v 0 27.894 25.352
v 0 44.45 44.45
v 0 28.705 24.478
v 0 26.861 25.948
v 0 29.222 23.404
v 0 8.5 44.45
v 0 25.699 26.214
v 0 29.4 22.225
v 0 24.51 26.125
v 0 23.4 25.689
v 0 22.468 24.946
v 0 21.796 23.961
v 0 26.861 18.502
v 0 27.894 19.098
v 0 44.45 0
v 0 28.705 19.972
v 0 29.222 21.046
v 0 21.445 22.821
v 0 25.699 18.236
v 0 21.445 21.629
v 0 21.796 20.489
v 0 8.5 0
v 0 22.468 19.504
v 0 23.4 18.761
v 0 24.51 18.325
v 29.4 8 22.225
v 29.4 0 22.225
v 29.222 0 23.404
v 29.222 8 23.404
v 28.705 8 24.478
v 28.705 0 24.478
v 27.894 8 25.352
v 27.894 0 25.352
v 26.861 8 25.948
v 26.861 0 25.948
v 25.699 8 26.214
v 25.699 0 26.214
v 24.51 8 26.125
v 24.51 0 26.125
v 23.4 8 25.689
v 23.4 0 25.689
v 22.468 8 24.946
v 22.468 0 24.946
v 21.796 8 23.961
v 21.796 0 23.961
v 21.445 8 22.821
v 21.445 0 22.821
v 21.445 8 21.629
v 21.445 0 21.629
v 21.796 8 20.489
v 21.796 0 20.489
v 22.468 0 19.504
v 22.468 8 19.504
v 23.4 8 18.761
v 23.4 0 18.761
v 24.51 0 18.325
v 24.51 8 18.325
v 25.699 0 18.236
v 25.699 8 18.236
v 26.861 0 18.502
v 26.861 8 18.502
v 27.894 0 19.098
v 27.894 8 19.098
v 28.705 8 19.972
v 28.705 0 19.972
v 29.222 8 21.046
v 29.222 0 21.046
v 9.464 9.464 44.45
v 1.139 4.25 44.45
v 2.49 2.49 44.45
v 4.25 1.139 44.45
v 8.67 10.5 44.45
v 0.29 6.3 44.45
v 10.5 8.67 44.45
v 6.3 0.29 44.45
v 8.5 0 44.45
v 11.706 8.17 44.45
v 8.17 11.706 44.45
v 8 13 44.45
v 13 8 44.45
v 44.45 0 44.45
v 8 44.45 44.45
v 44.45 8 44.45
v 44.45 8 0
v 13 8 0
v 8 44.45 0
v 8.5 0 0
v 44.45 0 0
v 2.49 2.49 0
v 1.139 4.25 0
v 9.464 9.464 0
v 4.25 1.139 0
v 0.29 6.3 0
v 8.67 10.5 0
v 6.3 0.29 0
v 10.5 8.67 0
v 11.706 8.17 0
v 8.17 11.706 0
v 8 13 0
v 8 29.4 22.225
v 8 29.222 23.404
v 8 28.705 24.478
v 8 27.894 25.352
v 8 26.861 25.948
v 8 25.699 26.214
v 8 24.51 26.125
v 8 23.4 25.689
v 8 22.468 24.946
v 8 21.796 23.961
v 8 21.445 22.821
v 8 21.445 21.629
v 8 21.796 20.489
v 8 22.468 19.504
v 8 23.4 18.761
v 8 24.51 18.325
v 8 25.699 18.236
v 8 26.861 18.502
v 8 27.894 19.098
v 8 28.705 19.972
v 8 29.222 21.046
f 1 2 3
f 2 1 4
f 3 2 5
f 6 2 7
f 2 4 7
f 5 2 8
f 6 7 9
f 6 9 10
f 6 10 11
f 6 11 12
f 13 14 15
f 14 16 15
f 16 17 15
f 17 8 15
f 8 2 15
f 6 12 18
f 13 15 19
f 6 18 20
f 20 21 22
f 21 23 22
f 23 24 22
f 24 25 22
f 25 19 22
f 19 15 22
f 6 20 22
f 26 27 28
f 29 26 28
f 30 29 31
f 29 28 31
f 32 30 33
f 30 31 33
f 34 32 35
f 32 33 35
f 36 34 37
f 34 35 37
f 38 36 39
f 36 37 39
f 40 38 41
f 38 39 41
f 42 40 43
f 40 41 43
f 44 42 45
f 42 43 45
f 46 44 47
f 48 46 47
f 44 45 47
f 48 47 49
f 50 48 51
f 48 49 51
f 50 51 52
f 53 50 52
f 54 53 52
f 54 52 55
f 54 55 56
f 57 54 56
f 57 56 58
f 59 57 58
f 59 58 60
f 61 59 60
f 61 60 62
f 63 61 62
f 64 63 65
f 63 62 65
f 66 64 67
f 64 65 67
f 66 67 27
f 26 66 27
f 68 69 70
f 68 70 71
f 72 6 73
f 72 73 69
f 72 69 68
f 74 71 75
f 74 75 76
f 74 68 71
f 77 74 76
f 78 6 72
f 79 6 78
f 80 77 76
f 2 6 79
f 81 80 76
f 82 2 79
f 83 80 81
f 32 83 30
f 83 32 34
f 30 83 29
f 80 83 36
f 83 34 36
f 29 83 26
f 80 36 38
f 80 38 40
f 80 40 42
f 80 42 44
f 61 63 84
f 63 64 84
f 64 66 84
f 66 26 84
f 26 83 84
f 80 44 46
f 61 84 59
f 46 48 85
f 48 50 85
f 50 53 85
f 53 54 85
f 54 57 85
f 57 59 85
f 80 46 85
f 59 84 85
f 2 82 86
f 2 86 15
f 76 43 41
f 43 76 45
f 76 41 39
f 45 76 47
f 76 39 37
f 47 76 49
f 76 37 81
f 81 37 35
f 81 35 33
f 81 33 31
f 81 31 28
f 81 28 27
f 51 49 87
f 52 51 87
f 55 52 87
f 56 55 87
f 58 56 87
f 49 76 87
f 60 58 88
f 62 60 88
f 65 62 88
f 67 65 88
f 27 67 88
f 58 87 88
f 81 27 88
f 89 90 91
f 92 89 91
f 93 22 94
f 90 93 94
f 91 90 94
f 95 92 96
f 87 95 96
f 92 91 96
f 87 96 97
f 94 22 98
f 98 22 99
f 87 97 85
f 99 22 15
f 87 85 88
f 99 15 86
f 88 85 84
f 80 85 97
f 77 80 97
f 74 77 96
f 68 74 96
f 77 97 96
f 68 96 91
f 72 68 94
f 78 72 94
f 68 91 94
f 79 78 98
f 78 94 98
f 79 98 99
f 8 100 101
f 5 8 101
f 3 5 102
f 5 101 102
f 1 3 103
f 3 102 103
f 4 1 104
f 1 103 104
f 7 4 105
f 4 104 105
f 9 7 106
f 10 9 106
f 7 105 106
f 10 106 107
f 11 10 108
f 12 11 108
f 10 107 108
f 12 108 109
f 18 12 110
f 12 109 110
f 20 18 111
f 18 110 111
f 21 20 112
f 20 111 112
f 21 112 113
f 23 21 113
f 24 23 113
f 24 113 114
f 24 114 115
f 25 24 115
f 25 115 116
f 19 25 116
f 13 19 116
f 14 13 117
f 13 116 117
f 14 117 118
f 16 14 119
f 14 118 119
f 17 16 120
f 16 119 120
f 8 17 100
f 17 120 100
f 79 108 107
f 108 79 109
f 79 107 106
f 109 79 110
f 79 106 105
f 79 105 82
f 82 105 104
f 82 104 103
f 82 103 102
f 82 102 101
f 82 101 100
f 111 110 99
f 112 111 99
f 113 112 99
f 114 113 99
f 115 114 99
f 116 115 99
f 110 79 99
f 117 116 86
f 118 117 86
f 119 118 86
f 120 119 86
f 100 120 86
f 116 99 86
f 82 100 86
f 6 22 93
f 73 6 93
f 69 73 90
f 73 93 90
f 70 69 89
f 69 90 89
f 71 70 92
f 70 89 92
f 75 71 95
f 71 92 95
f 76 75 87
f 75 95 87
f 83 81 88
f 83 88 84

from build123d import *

# Parameters (mm, degrees)
F1_DEPTH = 44.45
F2_R     = 4
F3_DEPTH = 8
F4_R     = 4
F5_DEPTH = 8


with BuildPart() as f1:
    # F0 (on Top) → F1 (new body)
    with BuildSketch(Plane.XY):
        with BuildLine():
            Line((8, 44.45), (0, 44.45))
            Line((0, 44.45), (0, 8.5))
            ThreePointArc((0, 8.5), (2.489592, 2.489592), (8.5, 0))
            Line((8.5, 0), (44.45, 0))
            Line((44.45, 0), (44.45, 8))
            Line((44.45, 8), (13, 8))
            ThreePointArc((13, 8), (9.464466, 9.464466), (8, 13))
            Line((8, 13), (8, 44.45))
        make_face()
    extrude(amount=F1_DEPTH)

    # F2 (on face) → F3 (cut, through all)
    with BuildSketch(Plane.YZ.offset(8)):
        with Locations((25.4, 22.225)):
            Circle(F2_R)
    extrude(amount=-F3_DEPTH, mode=Mode.SUBTRACT)

    # F4 (on face) → F5 (cut, through all)
    with BuildSketch(Plane.XZ):
        with Locations((25.4, 22.225)):
            Circle(F4_R)
    extrude(amount=-F5_DEPTH, mode=Mode.SUBTRACT)


solid = f1.part
